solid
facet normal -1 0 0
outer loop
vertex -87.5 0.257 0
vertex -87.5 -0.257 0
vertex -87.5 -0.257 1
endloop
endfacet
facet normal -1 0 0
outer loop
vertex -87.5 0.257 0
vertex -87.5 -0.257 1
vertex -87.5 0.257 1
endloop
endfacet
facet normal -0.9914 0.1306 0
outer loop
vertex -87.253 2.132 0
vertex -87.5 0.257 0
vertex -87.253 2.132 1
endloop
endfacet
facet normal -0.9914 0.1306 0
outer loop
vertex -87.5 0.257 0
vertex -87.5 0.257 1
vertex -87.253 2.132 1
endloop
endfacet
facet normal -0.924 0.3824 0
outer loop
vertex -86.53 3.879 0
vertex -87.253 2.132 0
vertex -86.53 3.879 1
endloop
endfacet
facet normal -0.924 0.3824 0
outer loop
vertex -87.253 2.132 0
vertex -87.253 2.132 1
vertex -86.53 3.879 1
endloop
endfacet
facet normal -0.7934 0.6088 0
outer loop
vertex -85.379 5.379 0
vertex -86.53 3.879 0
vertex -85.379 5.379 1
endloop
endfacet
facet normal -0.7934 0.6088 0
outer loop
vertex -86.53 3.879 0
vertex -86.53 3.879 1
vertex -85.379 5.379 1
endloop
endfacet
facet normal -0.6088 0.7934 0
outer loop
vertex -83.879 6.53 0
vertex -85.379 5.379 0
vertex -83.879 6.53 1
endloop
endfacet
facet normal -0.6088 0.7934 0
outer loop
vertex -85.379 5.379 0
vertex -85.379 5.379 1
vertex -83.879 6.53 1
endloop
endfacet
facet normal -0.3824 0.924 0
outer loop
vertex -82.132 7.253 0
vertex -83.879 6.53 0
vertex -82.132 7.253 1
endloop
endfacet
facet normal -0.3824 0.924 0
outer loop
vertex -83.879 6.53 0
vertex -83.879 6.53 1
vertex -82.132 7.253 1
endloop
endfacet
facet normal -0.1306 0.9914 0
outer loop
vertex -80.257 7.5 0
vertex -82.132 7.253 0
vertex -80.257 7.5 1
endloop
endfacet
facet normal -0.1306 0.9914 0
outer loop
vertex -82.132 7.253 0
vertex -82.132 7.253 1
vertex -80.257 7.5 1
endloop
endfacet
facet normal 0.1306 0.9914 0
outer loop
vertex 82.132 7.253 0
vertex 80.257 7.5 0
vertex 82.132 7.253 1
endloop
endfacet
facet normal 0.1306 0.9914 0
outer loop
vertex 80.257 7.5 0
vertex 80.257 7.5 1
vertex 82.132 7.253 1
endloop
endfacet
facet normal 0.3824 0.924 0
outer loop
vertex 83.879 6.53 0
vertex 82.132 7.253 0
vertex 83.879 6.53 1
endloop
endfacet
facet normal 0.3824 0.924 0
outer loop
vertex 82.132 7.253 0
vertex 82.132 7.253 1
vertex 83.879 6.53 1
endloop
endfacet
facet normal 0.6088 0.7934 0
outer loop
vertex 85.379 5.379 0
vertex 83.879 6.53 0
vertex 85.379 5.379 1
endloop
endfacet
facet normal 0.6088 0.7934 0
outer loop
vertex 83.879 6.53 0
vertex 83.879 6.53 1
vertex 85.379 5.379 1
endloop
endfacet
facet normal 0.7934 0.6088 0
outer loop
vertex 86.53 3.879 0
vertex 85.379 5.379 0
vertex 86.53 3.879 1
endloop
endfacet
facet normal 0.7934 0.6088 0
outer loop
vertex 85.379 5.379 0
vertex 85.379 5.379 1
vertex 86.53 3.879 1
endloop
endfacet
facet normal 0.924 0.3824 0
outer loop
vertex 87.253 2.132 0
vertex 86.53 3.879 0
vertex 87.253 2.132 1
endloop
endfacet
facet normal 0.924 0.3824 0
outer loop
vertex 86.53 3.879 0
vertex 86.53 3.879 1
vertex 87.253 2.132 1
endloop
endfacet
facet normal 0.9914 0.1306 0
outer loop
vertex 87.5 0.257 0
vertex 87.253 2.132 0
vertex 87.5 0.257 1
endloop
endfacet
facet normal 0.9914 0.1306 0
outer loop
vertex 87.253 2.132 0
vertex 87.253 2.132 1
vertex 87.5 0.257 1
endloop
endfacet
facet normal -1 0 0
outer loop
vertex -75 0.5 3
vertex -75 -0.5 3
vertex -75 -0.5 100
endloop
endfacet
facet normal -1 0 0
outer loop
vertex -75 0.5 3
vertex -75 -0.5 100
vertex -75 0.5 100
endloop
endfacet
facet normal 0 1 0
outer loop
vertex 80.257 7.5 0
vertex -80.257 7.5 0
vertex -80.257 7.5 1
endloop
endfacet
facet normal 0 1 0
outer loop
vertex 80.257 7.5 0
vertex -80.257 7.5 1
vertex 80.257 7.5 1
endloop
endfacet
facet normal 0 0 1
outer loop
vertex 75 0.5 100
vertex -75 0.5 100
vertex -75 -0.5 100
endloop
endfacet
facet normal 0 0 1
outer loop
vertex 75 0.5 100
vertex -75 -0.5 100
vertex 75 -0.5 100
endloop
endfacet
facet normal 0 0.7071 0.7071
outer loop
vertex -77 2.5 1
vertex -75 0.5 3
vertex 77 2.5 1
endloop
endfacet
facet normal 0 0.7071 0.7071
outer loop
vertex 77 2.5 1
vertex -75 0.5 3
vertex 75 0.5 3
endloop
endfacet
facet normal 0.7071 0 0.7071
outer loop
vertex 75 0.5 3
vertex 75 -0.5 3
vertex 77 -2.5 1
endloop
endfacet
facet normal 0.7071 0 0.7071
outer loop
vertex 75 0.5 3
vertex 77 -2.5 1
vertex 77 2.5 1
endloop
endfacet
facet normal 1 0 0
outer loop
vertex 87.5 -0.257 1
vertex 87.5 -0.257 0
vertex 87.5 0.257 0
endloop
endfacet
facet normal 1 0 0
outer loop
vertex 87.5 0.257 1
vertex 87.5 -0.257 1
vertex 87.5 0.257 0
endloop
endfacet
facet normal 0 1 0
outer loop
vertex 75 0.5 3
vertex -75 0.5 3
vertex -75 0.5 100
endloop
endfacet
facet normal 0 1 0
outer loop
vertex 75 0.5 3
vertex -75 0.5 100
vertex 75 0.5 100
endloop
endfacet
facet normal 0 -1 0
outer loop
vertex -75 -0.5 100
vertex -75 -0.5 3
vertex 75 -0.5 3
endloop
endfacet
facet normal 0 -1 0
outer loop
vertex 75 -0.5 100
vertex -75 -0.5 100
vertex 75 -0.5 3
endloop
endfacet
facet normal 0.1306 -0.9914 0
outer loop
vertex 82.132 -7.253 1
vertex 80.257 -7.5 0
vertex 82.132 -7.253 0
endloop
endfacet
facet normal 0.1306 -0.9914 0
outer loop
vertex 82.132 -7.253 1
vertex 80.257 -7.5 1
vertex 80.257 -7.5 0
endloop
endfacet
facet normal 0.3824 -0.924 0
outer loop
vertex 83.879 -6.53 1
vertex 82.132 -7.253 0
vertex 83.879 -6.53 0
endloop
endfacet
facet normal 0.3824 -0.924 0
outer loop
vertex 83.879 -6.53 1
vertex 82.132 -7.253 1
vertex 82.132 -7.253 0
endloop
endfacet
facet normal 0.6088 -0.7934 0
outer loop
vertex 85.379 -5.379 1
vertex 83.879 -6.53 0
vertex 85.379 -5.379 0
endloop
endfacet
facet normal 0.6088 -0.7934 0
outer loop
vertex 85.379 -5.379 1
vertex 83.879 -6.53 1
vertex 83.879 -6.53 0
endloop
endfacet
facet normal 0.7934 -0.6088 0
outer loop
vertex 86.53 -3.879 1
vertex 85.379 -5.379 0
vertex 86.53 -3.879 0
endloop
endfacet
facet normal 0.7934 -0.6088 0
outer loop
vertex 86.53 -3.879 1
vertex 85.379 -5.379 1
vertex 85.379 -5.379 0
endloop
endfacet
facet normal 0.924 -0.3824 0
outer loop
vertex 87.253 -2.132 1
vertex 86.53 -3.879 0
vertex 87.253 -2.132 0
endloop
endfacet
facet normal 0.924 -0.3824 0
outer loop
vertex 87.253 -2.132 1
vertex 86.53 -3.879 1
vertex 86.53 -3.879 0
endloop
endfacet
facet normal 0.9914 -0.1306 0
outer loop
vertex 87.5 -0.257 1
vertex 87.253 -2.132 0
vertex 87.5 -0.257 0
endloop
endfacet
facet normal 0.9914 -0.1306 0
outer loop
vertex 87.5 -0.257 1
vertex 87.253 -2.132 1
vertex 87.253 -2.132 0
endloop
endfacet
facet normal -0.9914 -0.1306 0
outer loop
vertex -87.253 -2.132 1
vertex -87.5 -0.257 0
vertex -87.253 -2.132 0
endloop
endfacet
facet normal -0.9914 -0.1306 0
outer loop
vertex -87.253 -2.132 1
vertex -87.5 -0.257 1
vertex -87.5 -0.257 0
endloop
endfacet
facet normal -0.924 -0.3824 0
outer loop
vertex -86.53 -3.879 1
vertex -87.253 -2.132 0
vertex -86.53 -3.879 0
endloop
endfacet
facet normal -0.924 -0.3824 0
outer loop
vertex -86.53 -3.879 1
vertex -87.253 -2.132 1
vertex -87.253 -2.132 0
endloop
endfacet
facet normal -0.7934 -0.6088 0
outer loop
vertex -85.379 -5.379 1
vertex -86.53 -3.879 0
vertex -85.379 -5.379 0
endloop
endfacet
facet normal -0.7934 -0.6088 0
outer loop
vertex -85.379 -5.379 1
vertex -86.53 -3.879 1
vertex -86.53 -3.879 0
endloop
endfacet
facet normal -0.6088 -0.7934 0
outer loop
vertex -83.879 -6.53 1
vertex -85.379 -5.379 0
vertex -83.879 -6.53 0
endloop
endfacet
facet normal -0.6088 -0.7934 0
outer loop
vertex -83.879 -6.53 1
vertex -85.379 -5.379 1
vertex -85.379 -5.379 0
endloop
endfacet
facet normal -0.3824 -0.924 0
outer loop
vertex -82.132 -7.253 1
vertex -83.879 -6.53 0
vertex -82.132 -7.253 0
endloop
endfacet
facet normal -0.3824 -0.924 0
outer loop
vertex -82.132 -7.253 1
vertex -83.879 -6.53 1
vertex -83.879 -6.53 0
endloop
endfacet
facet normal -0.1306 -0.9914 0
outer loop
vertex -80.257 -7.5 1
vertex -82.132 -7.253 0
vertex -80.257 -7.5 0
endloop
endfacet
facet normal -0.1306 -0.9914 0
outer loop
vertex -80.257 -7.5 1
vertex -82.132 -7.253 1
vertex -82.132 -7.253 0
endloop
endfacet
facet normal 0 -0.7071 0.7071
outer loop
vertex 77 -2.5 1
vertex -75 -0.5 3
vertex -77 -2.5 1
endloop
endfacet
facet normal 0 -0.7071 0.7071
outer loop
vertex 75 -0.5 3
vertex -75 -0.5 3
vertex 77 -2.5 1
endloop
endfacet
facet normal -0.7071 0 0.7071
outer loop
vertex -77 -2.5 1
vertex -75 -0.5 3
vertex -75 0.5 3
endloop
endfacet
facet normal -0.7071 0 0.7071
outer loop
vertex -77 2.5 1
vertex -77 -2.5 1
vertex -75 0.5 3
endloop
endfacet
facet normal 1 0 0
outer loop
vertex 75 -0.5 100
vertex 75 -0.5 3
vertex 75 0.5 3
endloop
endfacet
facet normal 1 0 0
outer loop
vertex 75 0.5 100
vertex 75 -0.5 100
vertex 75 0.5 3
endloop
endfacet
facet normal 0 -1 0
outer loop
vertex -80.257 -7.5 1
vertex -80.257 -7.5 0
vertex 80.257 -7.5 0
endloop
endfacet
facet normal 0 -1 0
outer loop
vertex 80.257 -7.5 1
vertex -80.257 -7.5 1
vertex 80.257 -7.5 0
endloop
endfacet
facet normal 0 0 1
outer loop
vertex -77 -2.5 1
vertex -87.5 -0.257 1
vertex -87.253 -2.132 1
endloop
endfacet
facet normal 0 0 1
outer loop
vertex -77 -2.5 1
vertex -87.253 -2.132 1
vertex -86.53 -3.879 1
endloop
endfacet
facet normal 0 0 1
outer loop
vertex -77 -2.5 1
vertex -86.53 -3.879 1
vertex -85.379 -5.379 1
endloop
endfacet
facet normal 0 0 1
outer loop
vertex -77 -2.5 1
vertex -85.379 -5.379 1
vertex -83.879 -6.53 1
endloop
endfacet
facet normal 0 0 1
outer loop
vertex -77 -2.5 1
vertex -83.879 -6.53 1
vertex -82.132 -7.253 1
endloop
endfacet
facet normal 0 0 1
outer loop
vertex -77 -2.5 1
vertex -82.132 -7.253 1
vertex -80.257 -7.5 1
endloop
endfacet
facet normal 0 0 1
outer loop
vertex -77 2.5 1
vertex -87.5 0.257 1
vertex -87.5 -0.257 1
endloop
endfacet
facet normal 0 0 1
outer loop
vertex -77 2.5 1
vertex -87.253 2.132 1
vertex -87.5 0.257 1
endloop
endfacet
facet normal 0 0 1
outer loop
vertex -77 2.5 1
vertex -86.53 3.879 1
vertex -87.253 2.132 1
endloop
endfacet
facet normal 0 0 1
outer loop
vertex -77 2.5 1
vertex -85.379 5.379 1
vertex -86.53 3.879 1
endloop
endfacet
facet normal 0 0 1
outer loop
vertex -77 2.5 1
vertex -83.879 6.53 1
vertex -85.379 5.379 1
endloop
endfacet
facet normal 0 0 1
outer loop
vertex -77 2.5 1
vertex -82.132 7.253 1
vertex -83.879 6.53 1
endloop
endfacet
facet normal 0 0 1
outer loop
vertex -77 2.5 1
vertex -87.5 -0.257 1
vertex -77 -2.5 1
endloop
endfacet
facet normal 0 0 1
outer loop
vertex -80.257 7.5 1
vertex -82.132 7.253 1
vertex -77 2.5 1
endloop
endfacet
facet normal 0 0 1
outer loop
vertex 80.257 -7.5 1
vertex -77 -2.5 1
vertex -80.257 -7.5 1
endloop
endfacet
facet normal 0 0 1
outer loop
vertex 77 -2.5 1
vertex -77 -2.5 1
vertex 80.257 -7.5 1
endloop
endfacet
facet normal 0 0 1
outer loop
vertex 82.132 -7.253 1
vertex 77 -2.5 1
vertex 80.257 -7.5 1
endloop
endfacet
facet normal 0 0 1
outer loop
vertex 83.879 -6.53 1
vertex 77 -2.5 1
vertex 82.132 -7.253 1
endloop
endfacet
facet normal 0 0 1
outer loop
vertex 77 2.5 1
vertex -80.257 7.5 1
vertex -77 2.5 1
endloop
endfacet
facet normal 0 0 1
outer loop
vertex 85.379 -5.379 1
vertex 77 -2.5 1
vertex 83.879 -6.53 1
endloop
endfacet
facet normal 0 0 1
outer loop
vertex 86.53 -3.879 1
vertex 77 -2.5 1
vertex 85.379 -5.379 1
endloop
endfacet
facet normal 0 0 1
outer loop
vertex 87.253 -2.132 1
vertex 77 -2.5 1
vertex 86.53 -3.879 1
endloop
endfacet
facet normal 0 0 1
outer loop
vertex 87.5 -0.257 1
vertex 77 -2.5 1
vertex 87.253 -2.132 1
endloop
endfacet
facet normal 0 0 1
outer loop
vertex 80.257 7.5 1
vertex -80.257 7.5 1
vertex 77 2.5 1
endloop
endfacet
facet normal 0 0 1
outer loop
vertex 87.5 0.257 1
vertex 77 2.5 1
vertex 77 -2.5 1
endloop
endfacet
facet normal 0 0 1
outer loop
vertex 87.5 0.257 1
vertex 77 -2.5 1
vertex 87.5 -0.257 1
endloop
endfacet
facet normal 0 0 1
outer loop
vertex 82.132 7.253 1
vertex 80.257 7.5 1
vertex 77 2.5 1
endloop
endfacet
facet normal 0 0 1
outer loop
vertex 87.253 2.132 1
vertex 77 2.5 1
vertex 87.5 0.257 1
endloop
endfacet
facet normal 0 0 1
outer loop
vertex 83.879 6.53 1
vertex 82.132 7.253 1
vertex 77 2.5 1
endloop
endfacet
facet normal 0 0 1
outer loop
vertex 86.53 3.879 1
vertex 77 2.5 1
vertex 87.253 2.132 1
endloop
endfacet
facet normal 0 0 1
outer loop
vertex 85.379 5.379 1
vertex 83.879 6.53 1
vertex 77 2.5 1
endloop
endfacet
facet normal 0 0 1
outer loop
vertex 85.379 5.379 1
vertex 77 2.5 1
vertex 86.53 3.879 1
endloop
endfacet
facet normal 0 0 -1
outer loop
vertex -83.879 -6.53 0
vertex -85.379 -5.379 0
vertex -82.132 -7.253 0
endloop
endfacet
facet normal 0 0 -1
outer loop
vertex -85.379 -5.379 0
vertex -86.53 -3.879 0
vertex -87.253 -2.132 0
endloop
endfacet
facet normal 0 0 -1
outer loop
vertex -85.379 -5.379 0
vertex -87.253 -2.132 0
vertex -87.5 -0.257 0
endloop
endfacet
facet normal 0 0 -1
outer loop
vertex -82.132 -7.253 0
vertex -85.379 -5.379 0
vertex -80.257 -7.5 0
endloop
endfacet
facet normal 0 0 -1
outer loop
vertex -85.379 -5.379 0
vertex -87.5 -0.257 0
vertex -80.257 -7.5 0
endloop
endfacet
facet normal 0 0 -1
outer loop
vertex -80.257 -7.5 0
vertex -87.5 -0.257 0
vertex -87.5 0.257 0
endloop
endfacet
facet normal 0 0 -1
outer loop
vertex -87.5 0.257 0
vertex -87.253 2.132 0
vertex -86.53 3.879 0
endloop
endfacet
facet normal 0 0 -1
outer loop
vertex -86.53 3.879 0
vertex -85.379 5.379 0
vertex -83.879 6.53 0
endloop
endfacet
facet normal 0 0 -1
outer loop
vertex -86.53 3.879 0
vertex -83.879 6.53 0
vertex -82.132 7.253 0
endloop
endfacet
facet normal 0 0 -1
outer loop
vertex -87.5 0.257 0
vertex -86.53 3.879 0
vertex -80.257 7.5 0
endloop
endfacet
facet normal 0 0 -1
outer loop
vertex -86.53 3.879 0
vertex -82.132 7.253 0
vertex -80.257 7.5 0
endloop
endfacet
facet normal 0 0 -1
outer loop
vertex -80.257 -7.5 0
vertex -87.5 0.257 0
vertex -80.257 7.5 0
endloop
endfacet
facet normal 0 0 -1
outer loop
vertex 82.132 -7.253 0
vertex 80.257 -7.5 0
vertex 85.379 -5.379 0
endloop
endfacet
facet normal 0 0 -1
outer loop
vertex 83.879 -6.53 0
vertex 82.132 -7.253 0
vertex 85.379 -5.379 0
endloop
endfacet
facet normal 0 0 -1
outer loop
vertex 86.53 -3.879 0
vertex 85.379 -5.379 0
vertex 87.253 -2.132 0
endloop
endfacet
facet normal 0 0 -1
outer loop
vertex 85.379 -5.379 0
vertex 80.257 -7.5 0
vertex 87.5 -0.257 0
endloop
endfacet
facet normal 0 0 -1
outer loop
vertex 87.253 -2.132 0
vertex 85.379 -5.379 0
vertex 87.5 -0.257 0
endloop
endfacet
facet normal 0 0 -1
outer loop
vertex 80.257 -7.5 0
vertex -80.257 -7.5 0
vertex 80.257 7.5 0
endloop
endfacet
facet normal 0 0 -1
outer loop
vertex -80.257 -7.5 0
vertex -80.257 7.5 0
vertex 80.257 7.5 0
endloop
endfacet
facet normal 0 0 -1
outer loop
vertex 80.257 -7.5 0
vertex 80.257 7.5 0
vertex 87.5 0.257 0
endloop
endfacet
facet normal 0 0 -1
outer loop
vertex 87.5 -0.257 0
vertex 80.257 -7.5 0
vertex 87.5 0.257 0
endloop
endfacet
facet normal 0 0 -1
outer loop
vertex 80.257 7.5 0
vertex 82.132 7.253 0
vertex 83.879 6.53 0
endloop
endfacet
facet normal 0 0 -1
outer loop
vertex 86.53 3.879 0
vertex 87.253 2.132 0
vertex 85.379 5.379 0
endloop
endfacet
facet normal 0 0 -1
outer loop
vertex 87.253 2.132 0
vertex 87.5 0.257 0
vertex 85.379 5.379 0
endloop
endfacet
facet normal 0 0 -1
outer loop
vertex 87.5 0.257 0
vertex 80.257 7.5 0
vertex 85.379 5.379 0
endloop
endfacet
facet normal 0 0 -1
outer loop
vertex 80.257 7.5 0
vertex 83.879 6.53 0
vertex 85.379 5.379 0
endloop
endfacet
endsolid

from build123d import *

# Parameters (mm, degrees)
F0_W     = 150
F0_H     = 1
F1_DEPTH = 100
F2_W     = 175
F2_H     = 15
F3_DEPTH = 1
F4_R     = 7.242641
F5_SIZE  = 2


with BuildPart() as f1:
    # F0 (on Top) → F1 (new body)
    with BuildSketch(Plane.XY):
        Rectangle(F0_W, F0_H)
    extrude(amount=F1_DEPTH)

    # F2 (on Top) → F3 (join)
    with BuildSketch(Plane.XY):
        Rectangle(F2_W, F2_H)
    extrude(amount=F3_DEPTH)

    # F4
    f4_edges = [f1.edges().sort_by_distance(p)[0] for p in [
        (-87.5, -7.5, 0.5),
        (-87.5, 7.5, 0.5),
        (87.5, -7.5, 0.5),
        (87.5, 7.5, 0.5),
    ]]
    fillet(f4_edges, radius=F4_R)

    # F5
    f5_edges = [f1.edges().sort_by_distance(p)[0] for p in [
        (0, 0.5, 1),
        (75, 0, 1),
        (0, -0.5, 1),
        (-75, 0, 1),
    ]]
    chamfer(f5_edges, length=F5_SIZE)


solid = f1.part
